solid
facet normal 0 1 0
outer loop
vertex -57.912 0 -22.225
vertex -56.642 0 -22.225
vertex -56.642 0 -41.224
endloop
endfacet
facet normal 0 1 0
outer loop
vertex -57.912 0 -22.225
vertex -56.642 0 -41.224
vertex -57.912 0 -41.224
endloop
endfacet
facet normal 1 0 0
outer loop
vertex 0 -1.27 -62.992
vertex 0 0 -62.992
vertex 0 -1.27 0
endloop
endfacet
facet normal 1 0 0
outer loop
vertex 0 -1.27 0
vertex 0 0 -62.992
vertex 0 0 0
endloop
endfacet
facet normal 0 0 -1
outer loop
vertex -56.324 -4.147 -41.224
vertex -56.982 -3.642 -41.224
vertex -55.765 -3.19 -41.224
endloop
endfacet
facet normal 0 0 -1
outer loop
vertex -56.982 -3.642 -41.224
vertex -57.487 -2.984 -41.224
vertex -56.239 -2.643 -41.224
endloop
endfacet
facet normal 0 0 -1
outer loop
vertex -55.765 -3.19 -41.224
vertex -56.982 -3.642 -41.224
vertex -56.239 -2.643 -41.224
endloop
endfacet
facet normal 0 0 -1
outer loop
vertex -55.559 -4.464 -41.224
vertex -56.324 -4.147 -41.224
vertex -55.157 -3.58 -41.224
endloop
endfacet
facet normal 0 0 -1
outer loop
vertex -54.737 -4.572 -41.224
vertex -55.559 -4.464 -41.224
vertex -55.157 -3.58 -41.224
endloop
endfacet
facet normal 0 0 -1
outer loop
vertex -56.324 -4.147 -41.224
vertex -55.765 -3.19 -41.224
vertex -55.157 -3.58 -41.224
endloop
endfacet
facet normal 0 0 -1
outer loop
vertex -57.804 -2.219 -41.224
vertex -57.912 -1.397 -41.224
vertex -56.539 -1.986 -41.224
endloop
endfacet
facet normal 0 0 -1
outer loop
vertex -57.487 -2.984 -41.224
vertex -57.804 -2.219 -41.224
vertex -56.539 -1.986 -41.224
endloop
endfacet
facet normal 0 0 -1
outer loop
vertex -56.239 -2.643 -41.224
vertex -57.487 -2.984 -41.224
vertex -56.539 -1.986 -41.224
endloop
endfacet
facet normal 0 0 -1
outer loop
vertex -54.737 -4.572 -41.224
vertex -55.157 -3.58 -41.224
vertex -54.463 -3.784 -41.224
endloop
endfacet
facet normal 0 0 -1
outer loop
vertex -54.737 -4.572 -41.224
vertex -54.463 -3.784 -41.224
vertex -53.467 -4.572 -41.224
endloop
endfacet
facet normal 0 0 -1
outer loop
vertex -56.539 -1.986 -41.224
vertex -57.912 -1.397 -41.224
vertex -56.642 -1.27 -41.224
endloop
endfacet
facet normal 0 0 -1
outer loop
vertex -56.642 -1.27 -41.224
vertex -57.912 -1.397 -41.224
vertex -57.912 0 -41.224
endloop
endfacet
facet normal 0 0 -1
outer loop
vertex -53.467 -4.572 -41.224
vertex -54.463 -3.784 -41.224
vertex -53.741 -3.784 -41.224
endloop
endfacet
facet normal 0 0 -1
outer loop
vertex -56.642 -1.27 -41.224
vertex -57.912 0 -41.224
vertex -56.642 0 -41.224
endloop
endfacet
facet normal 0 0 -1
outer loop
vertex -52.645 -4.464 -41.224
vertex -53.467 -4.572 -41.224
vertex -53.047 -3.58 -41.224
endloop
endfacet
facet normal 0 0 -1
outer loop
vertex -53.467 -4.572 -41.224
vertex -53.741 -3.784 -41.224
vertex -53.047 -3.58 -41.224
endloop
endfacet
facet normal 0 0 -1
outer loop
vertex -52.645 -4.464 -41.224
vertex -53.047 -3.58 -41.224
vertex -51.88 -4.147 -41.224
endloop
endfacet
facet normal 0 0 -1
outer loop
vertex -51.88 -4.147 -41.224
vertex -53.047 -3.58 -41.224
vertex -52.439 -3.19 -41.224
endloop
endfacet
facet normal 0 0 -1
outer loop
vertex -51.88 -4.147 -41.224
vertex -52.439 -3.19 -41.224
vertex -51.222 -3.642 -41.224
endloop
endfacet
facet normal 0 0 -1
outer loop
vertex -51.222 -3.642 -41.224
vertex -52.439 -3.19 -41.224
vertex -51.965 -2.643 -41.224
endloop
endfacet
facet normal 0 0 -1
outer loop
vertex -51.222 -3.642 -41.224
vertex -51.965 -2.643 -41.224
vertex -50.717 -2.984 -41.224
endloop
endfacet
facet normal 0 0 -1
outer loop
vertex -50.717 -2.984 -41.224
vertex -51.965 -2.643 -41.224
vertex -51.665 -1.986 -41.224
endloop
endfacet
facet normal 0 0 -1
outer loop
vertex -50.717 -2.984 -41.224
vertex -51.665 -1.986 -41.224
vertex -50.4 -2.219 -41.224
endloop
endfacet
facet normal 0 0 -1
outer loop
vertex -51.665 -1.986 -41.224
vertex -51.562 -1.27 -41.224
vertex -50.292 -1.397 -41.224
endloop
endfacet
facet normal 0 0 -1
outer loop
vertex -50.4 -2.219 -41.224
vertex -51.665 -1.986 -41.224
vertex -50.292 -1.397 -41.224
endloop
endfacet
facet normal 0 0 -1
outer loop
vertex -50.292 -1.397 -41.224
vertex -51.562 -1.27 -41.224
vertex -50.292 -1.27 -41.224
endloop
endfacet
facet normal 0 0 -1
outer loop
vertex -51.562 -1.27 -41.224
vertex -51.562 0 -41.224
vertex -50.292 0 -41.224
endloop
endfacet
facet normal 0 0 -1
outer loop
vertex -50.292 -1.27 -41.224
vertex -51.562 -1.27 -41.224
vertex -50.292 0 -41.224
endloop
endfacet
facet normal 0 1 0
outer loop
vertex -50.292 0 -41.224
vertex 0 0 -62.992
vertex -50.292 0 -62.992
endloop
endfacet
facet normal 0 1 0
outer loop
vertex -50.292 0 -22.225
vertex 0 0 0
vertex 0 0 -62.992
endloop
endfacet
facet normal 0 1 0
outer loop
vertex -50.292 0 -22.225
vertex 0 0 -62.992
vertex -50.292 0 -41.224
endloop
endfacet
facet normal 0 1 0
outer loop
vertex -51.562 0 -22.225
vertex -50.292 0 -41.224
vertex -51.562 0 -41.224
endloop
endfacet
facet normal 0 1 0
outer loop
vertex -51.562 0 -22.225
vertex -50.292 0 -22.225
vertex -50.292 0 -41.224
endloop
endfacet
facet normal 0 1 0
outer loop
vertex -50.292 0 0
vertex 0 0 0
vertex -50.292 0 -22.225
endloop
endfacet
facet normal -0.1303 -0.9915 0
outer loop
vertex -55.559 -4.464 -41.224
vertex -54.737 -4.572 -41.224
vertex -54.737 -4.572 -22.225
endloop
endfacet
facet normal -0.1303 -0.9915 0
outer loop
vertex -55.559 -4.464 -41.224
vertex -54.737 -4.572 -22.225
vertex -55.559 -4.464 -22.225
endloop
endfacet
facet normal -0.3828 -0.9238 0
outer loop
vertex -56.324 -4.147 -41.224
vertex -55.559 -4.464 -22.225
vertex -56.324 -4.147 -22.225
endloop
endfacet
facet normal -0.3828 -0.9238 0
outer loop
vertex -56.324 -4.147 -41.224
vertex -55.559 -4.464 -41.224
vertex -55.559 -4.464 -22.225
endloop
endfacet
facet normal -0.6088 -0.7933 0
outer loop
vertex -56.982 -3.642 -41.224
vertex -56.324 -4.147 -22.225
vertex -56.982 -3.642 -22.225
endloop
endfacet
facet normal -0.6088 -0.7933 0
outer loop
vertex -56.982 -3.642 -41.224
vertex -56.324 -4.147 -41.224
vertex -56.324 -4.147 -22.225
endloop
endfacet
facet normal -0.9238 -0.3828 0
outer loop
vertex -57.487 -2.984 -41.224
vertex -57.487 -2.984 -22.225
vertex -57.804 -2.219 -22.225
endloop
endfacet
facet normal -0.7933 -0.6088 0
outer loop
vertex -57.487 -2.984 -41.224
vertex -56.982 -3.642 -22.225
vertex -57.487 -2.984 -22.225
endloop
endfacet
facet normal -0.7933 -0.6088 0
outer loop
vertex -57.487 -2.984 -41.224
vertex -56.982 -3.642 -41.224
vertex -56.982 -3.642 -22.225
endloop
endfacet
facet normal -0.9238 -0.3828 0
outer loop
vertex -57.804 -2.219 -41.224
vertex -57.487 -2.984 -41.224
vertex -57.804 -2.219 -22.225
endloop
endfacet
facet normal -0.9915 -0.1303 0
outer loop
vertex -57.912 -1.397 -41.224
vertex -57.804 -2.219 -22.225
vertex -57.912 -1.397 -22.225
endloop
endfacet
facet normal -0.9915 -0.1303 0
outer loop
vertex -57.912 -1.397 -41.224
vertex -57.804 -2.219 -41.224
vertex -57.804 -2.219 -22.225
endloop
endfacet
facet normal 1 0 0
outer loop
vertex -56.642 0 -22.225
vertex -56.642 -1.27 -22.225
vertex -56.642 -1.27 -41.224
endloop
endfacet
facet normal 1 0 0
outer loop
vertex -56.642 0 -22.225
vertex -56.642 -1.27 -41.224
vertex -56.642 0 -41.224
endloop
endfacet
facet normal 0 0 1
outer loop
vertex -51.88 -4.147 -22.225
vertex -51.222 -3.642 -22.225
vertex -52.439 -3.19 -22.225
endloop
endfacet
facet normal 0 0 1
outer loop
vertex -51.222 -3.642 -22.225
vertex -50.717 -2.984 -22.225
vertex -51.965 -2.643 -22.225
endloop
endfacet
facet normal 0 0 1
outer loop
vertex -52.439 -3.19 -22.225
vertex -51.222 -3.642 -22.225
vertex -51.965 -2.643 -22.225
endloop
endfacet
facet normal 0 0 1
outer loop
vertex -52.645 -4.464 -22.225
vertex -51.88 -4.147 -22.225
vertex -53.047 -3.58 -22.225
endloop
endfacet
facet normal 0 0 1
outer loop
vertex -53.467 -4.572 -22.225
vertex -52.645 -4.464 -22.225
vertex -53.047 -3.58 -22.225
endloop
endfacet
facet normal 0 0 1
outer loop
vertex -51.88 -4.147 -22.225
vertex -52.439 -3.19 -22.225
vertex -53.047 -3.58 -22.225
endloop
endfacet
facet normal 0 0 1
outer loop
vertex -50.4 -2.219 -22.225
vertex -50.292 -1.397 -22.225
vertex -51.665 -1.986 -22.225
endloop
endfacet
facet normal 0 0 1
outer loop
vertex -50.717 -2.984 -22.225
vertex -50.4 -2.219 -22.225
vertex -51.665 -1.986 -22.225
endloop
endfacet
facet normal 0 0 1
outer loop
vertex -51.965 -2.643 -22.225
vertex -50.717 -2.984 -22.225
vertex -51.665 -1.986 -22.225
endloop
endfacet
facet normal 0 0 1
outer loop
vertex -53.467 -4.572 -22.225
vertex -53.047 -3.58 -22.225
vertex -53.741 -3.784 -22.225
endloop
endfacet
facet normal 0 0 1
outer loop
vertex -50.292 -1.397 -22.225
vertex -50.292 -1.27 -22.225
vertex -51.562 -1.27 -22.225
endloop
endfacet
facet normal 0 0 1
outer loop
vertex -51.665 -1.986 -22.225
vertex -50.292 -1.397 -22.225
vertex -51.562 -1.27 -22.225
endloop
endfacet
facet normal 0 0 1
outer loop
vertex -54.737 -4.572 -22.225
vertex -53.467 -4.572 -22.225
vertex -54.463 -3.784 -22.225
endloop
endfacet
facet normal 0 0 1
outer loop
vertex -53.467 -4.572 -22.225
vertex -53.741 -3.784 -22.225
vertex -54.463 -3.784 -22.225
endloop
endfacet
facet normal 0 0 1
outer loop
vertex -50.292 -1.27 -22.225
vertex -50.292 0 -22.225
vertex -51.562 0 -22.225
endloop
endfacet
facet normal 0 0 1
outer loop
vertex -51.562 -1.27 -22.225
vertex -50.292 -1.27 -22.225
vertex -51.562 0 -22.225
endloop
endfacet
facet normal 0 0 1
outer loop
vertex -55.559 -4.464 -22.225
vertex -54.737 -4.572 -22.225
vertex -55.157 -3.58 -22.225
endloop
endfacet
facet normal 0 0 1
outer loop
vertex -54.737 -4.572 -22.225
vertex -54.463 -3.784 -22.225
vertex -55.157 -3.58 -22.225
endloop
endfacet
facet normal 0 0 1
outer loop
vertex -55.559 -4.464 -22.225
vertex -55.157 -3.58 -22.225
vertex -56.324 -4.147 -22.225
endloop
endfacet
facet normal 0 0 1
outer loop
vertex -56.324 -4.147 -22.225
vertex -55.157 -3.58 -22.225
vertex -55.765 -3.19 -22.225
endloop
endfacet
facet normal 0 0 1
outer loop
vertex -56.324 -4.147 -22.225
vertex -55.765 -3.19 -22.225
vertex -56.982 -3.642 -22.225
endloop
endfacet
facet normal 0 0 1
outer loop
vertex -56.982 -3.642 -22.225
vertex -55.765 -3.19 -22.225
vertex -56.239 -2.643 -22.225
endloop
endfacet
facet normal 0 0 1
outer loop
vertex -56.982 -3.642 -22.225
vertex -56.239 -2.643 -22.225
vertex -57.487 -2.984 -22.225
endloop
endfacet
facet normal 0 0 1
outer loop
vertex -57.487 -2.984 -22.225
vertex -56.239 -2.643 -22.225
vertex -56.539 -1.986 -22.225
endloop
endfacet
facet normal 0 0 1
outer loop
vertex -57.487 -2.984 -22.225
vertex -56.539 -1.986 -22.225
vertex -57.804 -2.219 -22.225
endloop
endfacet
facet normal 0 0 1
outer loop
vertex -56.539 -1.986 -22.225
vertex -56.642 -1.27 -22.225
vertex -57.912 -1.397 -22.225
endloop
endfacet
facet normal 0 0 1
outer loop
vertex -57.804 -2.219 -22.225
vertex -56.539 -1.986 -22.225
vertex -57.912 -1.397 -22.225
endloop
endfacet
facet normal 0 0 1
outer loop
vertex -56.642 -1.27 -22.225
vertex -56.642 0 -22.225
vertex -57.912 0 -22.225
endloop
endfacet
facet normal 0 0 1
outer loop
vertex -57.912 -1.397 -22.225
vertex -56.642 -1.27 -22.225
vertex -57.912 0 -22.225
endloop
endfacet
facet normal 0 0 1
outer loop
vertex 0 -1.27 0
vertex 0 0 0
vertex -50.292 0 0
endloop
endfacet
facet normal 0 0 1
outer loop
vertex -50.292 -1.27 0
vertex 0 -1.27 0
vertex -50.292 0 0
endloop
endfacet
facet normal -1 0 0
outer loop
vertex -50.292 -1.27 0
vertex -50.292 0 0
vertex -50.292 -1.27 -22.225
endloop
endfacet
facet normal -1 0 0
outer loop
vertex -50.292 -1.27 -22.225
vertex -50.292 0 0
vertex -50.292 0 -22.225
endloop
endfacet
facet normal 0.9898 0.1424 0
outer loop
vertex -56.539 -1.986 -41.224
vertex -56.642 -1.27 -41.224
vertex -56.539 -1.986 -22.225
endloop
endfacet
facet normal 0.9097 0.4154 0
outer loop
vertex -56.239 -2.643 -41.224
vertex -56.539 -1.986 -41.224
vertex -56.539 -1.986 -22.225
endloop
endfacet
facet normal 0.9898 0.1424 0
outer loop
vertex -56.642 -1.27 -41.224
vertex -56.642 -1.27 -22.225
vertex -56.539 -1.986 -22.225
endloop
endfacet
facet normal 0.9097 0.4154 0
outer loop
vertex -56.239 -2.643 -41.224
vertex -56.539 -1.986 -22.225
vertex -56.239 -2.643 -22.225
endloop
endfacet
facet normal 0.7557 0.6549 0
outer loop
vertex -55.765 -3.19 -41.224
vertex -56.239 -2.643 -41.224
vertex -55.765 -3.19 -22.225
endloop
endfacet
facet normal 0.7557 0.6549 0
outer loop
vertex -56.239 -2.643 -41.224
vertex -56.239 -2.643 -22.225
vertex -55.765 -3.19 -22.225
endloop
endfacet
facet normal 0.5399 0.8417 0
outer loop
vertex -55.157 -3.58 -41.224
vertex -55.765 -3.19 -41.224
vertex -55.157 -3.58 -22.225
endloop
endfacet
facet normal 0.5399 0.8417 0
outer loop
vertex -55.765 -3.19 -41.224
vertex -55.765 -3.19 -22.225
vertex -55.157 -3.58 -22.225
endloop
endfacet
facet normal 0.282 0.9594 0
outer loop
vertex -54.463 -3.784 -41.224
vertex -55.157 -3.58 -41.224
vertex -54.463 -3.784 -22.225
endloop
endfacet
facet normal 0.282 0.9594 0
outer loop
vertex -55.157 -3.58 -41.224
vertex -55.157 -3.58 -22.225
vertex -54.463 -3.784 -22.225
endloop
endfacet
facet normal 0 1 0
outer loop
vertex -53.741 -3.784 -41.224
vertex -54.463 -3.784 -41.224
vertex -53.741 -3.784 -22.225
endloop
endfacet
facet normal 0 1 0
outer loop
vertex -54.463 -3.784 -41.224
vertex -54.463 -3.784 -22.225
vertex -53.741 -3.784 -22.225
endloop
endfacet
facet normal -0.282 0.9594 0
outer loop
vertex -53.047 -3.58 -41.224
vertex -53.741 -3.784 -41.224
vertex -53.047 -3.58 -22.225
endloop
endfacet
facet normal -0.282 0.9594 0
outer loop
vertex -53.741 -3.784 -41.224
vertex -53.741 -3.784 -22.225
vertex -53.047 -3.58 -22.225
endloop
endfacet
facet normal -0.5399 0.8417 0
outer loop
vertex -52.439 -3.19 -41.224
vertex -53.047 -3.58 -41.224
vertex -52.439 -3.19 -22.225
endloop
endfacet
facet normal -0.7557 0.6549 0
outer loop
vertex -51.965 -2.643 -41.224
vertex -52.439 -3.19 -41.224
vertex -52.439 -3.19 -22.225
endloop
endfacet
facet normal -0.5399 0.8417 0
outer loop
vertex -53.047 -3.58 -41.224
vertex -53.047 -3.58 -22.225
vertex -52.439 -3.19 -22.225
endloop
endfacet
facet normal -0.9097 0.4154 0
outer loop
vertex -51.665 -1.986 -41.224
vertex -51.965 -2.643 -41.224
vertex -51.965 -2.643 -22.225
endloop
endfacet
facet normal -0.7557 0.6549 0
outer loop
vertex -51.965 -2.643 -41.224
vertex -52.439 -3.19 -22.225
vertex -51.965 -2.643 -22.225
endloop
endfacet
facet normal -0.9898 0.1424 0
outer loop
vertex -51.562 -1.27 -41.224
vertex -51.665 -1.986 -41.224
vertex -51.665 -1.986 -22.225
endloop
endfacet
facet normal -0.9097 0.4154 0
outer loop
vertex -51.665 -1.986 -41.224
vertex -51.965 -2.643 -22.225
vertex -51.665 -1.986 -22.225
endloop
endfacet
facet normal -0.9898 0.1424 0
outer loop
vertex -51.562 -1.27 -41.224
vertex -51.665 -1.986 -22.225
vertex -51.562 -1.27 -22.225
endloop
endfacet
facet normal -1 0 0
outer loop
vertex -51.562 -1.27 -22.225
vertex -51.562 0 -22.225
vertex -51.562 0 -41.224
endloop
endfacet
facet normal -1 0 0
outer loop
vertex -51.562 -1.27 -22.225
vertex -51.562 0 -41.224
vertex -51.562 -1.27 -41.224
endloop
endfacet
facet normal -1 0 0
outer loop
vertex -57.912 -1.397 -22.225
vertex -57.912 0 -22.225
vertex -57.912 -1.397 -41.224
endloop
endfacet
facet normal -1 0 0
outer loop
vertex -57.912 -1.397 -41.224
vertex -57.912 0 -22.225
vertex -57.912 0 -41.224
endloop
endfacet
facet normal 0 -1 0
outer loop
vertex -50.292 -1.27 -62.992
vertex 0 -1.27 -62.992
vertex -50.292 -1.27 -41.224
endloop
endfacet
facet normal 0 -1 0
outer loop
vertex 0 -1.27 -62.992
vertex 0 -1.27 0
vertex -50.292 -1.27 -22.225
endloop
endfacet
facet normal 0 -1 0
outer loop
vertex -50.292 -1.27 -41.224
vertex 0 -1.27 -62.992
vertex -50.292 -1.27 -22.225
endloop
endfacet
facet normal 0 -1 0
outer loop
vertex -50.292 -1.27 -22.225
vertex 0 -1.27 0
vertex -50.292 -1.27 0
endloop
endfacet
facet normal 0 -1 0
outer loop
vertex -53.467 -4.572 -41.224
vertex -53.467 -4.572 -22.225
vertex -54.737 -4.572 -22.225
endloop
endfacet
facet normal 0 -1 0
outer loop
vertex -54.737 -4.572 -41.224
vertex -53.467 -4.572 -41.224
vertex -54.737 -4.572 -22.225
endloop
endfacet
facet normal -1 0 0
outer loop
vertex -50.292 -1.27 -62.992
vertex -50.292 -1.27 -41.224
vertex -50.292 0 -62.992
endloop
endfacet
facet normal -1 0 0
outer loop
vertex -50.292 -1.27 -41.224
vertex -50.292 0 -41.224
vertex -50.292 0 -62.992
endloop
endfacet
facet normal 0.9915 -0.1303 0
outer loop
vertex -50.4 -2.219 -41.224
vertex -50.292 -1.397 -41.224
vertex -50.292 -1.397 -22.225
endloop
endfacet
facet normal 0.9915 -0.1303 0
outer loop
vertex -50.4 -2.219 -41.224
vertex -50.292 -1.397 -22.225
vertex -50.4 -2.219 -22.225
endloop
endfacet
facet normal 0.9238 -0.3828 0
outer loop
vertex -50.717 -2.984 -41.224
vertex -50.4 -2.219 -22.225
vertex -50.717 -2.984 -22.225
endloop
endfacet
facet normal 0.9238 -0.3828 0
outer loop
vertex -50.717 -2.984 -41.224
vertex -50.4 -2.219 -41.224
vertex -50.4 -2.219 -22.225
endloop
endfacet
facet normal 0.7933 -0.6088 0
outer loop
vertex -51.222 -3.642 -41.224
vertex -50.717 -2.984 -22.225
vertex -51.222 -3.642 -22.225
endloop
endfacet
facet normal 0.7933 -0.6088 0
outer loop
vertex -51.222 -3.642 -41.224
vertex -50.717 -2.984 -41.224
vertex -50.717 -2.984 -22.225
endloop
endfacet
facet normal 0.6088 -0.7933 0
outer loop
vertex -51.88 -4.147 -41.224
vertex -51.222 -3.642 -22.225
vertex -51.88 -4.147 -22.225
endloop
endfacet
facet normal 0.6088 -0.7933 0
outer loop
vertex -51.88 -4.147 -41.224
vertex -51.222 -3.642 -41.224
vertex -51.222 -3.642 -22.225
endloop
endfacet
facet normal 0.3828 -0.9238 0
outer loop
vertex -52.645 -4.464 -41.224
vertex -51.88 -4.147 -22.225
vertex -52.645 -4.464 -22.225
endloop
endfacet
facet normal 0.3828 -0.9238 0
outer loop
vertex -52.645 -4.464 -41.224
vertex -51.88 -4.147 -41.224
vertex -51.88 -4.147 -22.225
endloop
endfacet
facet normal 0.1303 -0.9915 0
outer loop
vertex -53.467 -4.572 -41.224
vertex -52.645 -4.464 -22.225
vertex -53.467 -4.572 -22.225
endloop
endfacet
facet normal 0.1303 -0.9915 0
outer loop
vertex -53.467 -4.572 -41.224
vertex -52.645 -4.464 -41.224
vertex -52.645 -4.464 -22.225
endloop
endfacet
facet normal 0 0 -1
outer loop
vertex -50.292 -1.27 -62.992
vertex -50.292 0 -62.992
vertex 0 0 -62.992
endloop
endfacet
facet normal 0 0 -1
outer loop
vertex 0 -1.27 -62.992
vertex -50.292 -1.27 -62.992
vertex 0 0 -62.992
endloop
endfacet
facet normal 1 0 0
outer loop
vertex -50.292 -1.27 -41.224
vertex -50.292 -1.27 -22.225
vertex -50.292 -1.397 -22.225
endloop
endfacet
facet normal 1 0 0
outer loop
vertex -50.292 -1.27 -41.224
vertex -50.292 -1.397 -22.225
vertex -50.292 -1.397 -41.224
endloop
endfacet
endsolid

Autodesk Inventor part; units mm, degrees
ref_plane "YZ Plane" through (0, 0, 0) normal (1, 0, 0) x (0, 1, 0)
ref_plane "XZ Plane" through (0, 0, 0) normal (0, 1, 0) x (-1, 0, 0)
ref_plane "XY Plane" through (0, 0, 0) normal (0, 0, 1) x (1, 0, 0)
sketch "Sketch1" plane through (0, 0, 0) normal (0, 1, 0) x (-1, 0, 0)
  line L0 (0, 0) -> (50.292, 0)
  line L1 (50.292, 0) -> (50.292, -62.992)
  line L2 (50.292, -62.992) -> (0, -62.992)
  line L3 (0, -62.992) -> (0, 0)
  line L4 (50.292, -22.225) -> (57.912, -22.225)
  line L5 (57.912, -22.225) -> (57.912, -41.2242)
  line L6 (57.912, -41.2242) -> (50.292, -41.2242)
  line L7 (50.292, -41.2242) -> (50.292, -22.225)
  dimension "d0" = 50.292
  dimension "d1" = 62.992
  dimension "d2" = 7.62
  dimension "d3" = 18.9992
  dimension "d4" = 22.225
extrude "Extrusion1" add sketch "Sketch1" against normal blind 1.27 contours L0 L1 L2 L3
extrude "Extrusion2" add sketch "Sketch1" against normal blind 4.572 contours L4 L5 L6 L1
sketch "Sketch2" plane through (-57.912, 0, -22.225) normal (0, 0, 1) x (1, 0, 0)
  line L0 (7.62, 0) -> (0, 0) projected
  line L1 (1.27, 0) -> (6.35, 0)
  line L2 (6.35, 0) -> (6.35, -1.27)
  line L3 (3.81, -3.81) -> (3.81, -3.81)
  line L4 (1.27, -1.27) -> (1.27, 0)
  line L5 (0, 0) -> (0, -4.572) projected
  arc A0 (1.27, -1.27) -> (3.81, -3.81) centre (3.81, -1.27) ccw
  arc A1 (3.81, -3.81) -> (6.35, -1.27) centre (3.81, -1.27) ccw
  point P0 (57.912, 0)
  point P1 (6.35, -3.81)
  point P2 (1.27, -3.81)
  point P3 (3.81, -3.81)
  point P4 (6.35, 0)
  dimension "d9" = 5.08
  dimension "d10" = 3.81
  dimension "d11" = 1.27
  dimension "d12" = 2.54
  dimension "d13" = 2.54
extrude "Extrusion3" cut sketch "Sketch2" against normal through all
fillet "Fillet1" radius 3.175 2 edges at (-50.292, -4.572, -31.7246) (-57.912, -4.572, -31.7246)
properties part number "Battery Cover" material "PC/ABS Plastic"
